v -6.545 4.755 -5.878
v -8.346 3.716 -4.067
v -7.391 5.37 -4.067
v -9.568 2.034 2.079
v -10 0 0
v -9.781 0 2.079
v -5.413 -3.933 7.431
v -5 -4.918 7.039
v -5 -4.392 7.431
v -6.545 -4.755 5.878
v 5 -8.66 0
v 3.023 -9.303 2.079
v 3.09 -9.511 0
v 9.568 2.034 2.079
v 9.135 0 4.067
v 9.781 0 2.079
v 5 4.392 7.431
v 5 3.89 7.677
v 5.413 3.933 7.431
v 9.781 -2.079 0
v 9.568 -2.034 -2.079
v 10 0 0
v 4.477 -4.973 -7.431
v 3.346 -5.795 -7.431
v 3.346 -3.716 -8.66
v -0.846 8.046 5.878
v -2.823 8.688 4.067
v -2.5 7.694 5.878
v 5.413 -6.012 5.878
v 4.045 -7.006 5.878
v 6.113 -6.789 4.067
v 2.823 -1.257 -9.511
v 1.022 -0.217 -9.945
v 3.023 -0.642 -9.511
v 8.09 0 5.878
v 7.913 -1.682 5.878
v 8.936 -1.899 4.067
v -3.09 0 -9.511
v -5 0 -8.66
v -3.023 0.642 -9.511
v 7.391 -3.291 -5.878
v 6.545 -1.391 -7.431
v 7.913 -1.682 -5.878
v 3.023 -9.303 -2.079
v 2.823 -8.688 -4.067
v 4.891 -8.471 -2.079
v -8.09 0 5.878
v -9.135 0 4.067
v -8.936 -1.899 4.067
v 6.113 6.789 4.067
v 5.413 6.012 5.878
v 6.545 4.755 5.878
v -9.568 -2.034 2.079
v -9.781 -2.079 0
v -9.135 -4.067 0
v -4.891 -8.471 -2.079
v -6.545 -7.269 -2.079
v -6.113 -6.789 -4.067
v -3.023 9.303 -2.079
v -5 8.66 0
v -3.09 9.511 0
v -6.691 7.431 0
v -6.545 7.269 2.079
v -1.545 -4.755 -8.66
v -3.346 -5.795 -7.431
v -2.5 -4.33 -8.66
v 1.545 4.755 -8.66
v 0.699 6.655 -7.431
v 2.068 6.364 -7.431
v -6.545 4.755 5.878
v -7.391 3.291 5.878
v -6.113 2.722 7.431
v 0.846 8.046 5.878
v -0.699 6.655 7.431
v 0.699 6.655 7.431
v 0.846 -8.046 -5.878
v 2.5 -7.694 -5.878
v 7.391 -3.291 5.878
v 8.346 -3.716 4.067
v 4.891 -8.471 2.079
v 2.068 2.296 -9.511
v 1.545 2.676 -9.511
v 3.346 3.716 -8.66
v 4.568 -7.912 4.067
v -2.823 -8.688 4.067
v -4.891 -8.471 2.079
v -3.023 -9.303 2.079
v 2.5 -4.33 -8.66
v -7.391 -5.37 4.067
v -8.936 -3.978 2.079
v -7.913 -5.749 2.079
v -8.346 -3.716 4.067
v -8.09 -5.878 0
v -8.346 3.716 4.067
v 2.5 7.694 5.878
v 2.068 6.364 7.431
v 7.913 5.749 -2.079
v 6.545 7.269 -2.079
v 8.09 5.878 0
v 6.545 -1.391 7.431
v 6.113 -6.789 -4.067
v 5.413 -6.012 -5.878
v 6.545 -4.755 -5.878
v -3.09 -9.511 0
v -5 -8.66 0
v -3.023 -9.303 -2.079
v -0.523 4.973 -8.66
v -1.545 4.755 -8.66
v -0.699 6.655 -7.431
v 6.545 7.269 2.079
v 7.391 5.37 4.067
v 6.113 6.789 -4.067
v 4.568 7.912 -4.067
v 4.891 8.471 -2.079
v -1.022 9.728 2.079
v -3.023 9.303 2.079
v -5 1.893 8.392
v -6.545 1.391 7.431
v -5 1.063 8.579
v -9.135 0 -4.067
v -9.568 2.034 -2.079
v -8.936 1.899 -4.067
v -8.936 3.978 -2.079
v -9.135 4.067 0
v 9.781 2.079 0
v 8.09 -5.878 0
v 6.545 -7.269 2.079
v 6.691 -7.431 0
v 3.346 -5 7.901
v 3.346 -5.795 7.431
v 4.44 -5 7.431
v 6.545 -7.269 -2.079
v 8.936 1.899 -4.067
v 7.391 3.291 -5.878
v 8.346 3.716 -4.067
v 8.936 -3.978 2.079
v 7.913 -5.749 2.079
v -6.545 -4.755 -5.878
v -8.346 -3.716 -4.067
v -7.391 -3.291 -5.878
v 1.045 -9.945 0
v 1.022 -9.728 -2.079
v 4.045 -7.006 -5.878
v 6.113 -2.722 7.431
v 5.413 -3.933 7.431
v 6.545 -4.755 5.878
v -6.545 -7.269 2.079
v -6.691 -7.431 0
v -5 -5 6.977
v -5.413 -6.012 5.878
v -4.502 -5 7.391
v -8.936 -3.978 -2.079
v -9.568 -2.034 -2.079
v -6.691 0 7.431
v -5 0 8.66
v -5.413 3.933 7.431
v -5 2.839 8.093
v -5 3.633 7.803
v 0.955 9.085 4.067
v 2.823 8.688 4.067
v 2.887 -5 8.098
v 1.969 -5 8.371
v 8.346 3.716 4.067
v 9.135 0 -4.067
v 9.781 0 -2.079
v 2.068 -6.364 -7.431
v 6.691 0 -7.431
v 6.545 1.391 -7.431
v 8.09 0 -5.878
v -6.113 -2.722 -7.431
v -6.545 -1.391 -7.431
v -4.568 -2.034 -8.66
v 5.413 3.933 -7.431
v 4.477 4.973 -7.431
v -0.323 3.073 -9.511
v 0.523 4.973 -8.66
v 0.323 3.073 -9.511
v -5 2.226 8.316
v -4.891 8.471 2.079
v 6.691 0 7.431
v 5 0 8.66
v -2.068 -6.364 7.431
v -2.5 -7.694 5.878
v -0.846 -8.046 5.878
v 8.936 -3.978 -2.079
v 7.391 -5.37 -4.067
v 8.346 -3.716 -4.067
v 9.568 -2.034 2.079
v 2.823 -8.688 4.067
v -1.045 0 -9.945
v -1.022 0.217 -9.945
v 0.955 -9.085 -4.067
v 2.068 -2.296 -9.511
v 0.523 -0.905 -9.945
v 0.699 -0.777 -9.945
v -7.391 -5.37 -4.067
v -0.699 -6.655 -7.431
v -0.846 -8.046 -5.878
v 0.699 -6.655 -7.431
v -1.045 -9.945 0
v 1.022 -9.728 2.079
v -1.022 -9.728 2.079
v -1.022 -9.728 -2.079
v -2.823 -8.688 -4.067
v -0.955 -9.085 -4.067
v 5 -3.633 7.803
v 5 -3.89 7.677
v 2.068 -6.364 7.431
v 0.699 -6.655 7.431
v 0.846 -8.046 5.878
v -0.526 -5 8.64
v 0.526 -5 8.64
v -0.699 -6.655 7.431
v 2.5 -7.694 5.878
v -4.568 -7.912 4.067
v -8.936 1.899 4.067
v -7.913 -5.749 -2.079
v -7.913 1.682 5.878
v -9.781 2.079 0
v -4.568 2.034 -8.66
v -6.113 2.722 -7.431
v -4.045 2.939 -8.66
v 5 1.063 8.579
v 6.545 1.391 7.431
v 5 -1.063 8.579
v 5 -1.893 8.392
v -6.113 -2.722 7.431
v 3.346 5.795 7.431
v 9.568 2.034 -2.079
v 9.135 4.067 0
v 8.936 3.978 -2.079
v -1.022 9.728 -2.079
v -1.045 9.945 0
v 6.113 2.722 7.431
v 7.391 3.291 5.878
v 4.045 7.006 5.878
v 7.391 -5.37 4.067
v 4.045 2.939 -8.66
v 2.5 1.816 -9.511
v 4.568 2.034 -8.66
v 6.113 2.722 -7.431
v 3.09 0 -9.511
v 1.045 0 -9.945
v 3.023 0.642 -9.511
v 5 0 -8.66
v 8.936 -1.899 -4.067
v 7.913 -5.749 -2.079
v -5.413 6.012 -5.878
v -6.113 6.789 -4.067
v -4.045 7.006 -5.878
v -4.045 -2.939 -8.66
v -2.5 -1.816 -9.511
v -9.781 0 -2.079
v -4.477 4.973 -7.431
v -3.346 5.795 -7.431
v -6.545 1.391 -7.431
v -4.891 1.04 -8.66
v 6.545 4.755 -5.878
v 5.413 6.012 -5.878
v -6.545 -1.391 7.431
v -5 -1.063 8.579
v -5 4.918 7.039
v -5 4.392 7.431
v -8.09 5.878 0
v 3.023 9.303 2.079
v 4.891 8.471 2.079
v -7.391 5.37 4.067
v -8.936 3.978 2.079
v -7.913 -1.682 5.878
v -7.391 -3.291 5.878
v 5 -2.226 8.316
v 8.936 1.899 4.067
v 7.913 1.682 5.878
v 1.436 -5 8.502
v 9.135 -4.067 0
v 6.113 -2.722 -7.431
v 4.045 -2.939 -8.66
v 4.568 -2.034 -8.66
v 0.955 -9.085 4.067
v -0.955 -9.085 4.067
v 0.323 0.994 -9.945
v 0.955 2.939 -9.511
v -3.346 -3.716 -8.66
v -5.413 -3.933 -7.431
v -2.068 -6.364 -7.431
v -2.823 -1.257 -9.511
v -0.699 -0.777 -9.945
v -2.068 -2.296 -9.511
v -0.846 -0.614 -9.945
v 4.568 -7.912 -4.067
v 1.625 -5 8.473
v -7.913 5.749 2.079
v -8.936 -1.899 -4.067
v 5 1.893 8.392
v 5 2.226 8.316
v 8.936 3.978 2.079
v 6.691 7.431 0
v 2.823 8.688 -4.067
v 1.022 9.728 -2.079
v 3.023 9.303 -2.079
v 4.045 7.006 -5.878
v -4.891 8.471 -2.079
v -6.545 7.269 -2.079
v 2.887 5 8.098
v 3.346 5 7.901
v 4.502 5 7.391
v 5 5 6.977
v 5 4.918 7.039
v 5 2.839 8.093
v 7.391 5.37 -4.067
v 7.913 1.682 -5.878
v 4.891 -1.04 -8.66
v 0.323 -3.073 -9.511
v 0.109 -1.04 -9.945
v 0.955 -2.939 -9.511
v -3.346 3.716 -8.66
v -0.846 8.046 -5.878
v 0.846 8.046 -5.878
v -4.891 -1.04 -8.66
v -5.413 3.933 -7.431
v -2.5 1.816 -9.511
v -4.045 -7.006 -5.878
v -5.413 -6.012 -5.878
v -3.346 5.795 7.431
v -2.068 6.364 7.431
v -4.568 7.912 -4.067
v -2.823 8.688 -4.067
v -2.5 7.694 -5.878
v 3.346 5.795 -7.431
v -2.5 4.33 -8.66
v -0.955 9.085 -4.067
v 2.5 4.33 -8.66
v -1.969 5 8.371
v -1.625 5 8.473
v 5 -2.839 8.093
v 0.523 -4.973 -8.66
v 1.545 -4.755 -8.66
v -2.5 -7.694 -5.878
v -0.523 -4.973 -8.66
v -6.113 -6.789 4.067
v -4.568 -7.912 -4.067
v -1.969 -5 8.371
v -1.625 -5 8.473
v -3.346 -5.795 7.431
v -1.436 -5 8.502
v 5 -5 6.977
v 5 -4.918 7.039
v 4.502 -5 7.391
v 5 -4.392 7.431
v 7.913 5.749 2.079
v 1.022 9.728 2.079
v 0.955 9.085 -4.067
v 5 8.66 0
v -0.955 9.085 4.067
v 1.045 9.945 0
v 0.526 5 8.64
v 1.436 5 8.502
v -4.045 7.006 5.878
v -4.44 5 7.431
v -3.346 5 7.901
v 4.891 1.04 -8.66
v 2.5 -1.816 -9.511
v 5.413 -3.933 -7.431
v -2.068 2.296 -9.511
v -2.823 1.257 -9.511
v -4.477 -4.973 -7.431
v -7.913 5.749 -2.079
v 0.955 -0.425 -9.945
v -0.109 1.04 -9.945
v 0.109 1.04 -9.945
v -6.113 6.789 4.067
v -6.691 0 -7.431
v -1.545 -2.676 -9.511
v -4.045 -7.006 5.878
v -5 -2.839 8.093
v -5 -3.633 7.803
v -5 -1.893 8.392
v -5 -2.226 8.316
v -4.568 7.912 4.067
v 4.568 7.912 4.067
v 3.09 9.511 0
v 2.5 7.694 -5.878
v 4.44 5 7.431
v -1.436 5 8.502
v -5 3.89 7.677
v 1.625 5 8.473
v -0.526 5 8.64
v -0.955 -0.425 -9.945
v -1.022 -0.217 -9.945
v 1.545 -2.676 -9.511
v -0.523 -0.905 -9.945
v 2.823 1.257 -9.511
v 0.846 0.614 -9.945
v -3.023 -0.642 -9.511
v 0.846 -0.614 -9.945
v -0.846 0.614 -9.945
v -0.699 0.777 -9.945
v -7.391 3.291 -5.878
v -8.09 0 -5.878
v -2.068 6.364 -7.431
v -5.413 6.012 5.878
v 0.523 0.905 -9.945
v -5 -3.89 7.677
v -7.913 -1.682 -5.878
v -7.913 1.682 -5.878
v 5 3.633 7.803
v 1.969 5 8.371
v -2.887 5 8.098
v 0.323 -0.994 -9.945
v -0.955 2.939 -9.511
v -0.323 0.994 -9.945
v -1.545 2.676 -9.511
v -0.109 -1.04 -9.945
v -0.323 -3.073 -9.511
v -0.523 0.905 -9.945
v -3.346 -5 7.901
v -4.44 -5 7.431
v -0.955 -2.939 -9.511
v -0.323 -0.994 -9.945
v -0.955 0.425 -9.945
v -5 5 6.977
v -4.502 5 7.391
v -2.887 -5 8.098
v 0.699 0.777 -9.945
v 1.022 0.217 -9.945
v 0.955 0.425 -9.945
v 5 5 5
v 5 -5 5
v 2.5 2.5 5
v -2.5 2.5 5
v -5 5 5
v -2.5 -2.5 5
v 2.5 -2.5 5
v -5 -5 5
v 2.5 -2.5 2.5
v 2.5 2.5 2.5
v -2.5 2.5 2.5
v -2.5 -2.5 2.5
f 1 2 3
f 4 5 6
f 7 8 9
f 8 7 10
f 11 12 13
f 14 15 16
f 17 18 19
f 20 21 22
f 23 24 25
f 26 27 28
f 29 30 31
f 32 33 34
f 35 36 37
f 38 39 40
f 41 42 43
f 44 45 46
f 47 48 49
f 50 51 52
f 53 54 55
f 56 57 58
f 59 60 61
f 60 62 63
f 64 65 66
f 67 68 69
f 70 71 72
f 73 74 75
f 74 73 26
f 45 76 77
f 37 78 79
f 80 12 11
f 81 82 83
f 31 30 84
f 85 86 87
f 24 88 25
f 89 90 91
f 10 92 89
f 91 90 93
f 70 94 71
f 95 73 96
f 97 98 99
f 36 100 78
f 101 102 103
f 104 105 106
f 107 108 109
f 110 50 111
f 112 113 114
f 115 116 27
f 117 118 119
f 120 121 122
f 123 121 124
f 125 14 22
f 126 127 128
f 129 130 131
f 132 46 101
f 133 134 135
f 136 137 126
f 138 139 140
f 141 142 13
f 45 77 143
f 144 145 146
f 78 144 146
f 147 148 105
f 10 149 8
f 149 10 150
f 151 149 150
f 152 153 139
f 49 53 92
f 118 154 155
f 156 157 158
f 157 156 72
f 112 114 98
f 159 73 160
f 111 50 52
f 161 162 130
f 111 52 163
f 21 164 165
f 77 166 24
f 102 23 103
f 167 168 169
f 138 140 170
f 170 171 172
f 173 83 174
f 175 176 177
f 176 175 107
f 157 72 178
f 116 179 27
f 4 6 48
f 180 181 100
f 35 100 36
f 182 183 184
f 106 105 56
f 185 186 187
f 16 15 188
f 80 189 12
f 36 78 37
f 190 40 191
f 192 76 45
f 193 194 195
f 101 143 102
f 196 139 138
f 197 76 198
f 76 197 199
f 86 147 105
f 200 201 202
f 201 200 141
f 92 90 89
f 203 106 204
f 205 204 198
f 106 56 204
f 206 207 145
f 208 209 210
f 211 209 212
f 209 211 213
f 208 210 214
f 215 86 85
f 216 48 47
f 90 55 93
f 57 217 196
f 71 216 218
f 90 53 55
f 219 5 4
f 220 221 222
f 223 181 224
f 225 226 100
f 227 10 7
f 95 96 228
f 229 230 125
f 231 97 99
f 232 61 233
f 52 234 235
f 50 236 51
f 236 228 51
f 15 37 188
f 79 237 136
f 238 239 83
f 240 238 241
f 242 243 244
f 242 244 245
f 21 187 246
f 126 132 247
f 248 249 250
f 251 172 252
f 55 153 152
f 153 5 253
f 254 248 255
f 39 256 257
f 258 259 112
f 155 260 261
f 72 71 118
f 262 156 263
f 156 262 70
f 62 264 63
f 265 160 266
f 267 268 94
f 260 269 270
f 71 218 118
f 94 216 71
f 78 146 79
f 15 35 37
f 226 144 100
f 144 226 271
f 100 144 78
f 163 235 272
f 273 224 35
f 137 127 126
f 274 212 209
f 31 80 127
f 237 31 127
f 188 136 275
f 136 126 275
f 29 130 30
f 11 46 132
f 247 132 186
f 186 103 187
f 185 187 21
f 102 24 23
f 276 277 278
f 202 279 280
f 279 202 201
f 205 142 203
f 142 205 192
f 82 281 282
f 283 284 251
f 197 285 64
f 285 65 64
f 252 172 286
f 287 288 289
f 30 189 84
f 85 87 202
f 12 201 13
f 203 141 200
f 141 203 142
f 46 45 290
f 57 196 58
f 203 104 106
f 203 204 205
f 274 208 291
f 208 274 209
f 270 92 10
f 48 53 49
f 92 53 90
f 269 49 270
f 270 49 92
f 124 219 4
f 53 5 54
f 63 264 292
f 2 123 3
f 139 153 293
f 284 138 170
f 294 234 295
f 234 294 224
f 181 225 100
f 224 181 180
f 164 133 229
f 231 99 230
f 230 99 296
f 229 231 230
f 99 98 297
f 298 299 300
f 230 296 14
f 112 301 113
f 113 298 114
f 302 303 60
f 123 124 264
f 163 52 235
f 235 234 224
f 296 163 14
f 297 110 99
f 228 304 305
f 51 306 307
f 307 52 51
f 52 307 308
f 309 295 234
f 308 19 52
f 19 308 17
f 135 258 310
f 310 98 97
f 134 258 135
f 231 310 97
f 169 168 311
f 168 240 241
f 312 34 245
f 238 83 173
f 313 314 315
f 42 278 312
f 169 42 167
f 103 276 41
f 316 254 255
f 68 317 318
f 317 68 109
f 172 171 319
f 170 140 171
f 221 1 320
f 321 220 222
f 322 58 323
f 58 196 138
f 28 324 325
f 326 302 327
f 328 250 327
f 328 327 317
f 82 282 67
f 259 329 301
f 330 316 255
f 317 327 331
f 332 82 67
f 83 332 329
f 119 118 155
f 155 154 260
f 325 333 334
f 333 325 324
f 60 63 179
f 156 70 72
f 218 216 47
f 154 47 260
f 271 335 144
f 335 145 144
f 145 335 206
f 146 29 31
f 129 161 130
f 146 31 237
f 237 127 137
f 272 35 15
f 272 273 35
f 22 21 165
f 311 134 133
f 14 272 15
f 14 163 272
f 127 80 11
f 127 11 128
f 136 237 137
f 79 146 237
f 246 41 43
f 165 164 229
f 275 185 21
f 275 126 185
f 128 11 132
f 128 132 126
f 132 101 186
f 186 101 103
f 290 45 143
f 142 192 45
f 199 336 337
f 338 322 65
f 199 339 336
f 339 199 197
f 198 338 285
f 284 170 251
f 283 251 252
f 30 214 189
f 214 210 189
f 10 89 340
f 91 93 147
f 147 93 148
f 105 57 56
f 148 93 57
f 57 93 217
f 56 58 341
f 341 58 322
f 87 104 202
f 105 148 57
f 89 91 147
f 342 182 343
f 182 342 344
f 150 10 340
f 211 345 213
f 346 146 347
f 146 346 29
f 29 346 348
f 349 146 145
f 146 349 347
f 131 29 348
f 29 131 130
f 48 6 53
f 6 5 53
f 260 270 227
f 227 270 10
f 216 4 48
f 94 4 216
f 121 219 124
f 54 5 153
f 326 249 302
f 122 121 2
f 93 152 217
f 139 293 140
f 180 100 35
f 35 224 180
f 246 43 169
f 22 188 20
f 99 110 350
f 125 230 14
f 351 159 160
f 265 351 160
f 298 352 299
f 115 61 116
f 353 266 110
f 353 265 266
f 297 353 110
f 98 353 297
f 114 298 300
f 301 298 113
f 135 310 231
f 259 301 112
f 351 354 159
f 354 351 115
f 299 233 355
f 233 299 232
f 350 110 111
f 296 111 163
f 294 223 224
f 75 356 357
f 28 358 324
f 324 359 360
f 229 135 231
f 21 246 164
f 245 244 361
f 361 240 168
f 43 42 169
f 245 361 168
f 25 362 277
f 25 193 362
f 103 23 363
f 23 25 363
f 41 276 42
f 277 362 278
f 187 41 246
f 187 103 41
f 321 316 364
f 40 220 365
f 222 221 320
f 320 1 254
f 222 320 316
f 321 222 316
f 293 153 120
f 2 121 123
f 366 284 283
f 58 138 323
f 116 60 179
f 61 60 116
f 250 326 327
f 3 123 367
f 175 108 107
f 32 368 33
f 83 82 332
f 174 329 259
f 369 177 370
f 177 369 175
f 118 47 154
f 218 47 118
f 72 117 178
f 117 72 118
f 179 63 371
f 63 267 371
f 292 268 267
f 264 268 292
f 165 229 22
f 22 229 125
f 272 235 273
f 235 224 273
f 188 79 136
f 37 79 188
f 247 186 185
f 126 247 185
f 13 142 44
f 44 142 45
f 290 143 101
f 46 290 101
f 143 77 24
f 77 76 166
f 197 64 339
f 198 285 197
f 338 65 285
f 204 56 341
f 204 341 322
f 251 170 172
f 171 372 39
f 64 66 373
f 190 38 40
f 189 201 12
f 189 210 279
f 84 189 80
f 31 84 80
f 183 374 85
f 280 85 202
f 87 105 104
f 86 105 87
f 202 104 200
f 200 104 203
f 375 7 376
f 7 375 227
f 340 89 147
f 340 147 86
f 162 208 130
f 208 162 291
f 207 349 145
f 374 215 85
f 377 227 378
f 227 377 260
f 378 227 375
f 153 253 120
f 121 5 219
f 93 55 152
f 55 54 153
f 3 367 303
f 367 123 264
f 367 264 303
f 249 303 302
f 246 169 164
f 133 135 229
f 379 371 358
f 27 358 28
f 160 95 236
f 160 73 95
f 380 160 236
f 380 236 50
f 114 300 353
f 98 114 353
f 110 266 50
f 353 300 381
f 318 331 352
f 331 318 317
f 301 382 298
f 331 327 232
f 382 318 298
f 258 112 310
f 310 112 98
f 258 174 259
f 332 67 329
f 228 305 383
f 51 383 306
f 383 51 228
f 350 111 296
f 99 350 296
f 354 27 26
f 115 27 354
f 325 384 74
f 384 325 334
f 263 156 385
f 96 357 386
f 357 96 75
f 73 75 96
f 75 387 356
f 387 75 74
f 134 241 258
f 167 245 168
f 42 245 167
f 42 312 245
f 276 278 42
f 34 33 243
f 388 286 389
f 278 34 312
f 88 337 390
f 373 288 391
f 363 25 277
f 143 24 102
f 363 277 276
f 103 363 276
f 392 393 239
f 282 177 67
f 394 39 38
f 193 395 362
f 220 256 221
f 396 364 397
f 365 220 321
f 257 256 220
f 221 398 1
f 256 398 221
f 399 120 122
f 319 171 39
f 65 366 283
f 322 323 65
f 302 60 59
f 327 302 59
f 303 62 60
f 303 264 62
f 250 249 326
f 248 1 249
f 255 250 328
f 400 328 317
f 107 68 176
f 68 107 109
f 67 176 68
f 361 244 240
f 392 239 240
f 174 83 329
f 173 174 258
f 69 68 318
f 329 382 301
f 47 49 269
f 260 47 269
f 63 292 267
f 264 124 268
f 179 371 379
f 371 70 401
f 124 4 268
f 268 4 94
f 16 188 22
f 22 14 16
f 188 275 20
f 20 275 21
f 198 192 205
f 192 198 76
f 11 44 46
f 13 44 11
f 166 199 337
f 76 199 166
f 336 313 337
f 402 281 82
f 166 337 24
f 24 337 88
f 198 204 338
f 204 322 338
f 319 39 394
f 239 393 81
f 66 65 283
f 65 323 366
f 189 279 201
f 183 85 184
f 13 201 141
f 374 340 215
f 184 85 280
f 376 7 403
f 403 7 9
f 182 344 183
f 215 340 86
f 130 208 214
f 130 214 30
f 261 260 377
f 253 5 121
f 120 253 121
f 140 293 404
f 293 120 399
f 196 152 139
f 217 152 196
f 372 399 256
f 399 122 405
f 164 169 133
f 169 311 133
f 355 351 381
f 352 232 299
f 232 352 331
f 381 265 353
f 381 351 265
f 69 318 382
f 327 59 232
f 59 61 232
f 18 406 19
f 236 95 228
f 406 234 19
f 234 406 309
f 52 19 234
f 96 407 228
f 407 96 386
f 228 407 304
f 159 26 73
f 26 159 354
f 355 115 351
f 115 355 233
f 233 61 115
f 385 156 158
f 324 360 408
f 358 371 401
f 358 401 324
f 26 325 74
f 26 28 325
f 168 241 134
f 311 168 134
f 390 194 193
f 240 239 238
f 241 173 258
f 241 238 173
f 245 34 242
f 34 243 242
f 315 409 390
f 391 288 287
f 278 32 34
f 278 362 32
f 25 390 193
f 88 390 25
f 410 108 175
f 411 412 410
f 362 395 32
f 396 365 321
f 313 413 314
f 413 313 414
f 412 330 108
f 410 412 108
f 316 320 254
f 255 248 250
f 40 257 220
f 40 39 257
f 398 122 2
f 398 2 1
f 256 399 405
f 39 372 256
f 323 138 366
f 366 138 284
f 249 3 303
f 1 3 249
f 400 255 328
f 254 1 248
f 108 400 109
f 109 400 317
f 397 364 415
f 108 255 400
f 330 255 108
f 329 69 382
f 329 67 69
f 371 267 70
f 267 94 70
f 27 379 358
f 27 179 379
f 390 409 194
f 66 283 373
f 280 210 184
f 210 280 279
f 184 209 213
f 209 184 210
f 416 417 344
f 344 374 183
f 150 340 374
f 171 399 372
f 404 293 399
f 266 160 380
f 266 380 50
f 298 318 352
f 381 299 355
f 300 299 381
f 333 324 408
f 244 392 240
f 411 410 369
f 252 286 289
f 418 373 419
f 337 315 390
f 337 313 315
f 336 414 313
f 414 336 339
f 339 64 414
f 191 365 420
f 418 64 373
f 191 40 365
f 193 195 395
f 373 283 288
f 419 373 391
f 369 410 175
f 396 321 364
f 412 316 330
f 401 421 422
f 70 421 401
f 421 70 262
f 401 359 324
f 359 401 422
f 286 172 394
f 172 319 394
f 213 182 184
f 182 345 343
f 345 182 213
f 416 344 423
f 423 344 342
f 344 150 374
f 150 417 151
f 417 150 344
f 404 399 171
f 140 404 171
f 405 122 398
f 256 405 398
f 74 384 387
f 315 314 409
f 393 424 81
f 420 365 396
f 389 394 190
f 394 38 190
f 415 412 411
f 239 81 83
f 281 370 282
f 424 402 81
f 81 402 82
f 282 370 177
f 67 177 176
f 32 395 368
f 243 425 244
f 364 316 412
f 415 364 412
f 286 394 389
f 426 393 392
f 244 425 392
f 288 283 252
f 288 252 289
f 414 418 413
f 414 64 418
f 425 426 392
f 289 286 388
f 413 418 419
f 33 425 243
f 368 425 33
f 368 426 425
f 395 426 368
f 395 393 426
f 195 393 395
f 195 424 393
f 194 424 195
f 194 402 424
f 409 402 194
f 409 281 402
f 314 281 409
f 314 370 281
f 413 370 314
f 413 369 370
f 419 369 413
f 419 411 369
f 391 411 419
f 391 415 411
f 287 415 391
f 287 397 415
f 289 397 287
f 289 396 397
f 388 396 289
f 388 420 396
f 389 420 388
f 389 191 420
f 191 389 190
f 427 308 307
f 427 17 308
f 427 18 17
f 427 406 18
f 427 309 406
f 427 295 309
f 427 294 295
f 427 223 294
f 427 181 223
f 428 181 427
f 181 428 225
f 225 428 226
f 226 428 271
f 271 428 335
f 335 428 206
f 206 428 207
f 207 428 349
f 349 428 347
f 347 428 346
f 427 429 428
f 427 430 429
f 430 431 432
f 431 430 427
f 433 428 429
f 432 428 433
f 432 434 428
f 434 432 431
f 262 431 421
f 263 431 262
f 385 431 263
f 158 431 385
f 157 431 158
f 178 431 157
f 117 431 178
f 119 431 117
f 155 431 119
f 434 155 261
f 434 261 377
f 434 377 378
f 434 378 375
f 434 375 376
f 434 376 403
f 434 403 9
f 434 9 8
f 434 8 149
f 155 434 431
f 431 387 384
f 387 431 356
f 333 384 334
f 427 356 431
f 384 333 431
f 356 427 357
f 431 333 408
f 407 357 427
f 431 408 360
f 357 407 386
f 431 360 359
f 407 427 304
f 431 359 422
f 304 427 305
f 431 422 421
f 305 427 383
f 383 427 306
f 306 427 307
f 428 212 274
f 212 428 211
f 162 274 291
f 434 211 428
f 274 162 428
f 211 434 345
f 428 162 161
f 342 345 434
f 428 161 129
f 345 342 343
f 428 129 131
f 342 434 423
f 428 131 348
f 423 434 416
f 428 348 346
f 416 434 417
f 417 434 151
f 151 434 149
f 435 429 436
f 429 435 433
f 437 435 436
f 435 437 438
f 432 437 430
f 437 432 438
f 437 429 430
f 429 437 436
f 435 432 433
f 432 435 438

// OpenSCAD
difference() {
  sphere(10);
  color("red") translate([0,0,10]) cube(10, center=true);
  translate([0,0,5]) cube(5, center=true);
}
